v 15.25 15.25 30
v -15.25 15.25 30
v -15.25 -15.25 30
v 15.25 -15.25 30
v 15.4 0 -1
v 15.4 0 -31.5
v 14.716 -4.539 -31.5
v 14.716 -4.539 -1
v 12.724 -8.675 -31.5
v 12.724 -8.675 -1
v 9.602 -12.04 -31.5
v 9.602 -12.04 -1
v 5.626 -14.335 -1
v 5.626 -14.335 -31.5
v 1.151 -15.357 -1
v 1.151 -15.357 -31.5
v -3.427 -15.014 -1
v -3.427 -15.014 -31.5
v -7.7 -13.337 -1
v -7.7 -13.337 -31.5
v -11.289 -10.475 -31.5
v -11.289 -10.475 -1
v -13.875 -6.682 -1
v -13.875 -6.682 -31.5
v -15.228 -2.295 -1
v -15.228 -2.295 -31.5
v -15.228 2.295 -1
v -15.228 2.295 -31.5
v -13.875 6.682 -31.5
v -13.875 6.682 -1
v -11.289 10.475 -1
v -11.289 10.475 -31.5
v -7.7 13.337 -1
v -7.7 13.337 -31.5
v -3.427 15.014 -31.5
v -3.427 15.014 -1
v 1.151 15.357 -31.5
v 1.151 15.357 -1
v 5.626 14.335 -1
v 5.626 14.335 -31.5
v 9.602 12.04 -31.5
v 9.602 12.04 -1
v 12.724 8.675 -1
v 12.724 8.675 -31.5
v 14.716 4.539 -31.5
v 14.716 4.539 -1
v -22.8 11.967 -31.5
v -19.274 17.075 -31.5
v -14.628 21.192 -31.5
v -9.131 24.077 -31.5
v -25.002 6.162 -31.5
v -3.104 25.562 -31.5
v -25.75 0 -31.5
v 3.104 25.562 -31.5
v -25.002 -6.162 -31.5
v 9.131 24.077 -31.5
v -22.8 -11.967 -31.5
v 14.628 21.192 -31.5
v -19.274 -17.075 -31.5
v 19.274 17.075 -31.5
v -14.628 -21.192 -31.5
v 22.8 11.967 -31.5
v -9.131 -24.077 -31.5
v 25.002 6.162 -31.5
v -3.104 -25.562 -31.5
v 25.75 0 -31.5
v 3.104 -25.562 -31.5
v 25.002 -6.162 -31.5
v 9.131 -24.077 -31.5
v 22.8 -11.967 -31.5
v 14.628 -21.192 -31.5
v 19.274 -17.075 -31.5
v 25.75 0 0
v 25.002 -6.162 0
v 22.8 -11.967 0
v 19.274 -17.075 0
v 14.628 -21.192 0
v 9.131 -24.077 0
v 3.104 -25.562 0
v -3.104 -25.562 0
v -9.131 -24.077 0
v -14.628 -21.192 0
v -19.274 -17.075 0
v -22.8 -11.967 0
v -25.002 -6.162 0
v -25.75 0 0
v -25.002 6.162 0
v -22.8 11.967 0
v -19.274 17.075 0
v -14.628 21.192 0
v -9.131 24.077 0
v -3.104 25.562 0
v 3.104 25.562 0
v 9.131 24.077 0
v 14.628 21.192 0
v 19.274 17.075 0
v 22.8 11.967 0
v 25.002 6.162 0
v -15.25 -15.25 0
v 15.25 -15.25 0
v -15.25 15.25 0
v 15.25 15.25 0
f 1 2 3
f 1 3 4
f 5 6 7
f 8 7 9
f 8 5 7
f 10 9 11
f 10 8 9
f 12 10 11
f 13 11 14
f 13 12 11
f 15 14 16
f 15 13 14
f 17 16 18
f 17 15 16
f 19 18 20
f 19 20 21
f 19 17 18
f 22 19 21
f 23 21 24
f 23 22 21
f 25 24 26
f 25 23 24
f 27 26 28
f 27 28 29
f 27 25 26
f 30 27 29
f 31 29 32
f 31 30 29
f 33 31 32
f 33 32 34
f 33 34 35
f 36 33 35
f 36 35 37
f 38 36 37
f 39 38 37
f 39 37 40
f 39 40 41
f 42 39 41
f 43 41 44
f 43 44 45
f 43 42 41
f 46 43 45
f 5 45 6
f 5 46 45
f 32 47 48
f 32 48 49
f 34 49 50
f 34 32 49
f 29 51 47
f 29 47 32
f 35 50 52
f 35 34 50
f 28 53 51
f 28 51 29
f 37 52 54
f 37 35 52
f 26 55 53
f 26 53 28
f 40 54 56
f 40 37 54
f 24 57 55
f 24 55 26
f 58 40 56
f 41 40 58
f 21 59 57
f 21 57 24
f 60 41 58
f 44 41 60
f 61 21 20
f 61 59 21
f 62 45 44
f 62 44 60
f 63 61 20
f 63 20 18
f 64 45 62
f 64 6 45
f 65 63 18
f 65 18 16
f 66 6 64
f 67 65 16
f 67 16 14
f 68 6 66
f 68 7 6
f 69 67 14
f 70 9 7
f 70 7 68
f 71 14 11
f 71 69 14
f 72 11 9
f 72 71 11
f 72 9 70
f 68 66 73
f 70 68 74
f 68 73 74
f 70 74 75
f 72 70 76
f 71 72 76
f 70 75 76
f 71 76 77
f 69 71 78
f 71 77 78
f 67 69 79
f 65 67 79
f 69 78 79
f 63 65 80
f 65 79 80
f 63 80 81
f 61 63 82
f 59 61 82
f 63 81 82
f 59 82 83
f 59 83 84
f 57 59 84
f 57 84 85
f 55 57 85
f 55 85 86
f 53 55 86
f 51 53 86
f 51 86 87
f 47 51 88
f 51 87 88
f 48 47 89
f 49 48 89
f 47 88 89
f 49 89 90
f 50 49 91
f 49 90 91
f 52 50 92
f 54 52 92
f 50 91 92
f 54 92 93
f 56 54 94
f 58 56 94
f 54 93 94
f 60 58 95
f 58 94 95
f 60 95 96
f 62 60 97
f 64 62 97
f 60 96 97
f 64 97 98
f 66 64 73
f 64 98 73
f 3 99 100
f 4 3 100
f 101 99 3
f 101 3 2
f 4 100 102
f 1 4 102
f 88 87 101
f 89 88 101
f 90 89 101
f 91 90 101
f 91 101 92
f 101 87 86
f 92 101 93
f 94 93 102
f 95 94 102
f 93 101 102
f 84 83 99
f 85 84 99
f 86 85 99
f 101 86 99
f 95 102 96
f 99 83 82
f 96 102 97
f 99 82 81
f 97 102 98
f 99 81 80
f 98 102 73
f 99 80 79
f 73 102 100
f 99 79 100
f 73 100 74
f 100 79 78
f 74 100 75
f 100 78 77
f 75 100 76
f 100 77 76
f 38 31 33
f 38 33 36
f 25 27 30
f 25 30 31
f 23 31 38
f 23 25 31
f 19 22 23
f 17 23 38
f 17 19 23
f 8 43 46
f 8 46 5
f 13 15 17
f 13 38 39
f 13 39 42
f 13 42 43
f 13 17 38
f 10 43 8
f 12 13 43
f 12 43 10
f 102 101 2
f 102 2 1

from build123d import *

# Parameters (mm, degrees)
F0_W     = 30.5
F0_H     = 30.5
F1_DEPTH = 30
F2_R     = 25.75
F2_W     = 30.5
F2_H     = 30.5
F2_R_2   = 15
F3_DEPTH = 1
F4_R     = 25.75
F4_R_2   = 15.4
F5_DEPTH = 30.5


# Not quite as in the source:
# - a feature names something its author has since deleted; it is built from what else it names


with BuildPart() as f1:
    # F0 (on Top) → F1 (new body)
    with BuildSketch(Plane.XY):
        Rectangle(F0_W, F0_H)
    extrude(amount=F1_DEPTH)

    # F2 (on face) → F3 (join)
    with BuildSketch(Plane(origin=(0, 0, 0), x_dir=(1, 0, 0), z_dir=(0, 0, -1))):
        Circle(F2_R)
        Rectangle(F2_W, F2_H, mode=Mode.SUBTRACT)
        Rectangle(F2_W, F2_H)
        Circle(F2_R_2, mode=Mode.SUBTRACT)
        Circle(F2_R_2)
    extrude(amount=F3_DEPTH)

    # F4 (on face) → F5 (join)
    with BuildSketch(Plane(origin=(0, 0, -1), x_dir=(1, 0, 0), z_dir=(0, 0, -1))):
        Circle(F4_R)
        Circle(F4_R_2, mode=Mode.SUBTRACT)
    extrude(amount=F5_DEPTH)


solid = f1.part
